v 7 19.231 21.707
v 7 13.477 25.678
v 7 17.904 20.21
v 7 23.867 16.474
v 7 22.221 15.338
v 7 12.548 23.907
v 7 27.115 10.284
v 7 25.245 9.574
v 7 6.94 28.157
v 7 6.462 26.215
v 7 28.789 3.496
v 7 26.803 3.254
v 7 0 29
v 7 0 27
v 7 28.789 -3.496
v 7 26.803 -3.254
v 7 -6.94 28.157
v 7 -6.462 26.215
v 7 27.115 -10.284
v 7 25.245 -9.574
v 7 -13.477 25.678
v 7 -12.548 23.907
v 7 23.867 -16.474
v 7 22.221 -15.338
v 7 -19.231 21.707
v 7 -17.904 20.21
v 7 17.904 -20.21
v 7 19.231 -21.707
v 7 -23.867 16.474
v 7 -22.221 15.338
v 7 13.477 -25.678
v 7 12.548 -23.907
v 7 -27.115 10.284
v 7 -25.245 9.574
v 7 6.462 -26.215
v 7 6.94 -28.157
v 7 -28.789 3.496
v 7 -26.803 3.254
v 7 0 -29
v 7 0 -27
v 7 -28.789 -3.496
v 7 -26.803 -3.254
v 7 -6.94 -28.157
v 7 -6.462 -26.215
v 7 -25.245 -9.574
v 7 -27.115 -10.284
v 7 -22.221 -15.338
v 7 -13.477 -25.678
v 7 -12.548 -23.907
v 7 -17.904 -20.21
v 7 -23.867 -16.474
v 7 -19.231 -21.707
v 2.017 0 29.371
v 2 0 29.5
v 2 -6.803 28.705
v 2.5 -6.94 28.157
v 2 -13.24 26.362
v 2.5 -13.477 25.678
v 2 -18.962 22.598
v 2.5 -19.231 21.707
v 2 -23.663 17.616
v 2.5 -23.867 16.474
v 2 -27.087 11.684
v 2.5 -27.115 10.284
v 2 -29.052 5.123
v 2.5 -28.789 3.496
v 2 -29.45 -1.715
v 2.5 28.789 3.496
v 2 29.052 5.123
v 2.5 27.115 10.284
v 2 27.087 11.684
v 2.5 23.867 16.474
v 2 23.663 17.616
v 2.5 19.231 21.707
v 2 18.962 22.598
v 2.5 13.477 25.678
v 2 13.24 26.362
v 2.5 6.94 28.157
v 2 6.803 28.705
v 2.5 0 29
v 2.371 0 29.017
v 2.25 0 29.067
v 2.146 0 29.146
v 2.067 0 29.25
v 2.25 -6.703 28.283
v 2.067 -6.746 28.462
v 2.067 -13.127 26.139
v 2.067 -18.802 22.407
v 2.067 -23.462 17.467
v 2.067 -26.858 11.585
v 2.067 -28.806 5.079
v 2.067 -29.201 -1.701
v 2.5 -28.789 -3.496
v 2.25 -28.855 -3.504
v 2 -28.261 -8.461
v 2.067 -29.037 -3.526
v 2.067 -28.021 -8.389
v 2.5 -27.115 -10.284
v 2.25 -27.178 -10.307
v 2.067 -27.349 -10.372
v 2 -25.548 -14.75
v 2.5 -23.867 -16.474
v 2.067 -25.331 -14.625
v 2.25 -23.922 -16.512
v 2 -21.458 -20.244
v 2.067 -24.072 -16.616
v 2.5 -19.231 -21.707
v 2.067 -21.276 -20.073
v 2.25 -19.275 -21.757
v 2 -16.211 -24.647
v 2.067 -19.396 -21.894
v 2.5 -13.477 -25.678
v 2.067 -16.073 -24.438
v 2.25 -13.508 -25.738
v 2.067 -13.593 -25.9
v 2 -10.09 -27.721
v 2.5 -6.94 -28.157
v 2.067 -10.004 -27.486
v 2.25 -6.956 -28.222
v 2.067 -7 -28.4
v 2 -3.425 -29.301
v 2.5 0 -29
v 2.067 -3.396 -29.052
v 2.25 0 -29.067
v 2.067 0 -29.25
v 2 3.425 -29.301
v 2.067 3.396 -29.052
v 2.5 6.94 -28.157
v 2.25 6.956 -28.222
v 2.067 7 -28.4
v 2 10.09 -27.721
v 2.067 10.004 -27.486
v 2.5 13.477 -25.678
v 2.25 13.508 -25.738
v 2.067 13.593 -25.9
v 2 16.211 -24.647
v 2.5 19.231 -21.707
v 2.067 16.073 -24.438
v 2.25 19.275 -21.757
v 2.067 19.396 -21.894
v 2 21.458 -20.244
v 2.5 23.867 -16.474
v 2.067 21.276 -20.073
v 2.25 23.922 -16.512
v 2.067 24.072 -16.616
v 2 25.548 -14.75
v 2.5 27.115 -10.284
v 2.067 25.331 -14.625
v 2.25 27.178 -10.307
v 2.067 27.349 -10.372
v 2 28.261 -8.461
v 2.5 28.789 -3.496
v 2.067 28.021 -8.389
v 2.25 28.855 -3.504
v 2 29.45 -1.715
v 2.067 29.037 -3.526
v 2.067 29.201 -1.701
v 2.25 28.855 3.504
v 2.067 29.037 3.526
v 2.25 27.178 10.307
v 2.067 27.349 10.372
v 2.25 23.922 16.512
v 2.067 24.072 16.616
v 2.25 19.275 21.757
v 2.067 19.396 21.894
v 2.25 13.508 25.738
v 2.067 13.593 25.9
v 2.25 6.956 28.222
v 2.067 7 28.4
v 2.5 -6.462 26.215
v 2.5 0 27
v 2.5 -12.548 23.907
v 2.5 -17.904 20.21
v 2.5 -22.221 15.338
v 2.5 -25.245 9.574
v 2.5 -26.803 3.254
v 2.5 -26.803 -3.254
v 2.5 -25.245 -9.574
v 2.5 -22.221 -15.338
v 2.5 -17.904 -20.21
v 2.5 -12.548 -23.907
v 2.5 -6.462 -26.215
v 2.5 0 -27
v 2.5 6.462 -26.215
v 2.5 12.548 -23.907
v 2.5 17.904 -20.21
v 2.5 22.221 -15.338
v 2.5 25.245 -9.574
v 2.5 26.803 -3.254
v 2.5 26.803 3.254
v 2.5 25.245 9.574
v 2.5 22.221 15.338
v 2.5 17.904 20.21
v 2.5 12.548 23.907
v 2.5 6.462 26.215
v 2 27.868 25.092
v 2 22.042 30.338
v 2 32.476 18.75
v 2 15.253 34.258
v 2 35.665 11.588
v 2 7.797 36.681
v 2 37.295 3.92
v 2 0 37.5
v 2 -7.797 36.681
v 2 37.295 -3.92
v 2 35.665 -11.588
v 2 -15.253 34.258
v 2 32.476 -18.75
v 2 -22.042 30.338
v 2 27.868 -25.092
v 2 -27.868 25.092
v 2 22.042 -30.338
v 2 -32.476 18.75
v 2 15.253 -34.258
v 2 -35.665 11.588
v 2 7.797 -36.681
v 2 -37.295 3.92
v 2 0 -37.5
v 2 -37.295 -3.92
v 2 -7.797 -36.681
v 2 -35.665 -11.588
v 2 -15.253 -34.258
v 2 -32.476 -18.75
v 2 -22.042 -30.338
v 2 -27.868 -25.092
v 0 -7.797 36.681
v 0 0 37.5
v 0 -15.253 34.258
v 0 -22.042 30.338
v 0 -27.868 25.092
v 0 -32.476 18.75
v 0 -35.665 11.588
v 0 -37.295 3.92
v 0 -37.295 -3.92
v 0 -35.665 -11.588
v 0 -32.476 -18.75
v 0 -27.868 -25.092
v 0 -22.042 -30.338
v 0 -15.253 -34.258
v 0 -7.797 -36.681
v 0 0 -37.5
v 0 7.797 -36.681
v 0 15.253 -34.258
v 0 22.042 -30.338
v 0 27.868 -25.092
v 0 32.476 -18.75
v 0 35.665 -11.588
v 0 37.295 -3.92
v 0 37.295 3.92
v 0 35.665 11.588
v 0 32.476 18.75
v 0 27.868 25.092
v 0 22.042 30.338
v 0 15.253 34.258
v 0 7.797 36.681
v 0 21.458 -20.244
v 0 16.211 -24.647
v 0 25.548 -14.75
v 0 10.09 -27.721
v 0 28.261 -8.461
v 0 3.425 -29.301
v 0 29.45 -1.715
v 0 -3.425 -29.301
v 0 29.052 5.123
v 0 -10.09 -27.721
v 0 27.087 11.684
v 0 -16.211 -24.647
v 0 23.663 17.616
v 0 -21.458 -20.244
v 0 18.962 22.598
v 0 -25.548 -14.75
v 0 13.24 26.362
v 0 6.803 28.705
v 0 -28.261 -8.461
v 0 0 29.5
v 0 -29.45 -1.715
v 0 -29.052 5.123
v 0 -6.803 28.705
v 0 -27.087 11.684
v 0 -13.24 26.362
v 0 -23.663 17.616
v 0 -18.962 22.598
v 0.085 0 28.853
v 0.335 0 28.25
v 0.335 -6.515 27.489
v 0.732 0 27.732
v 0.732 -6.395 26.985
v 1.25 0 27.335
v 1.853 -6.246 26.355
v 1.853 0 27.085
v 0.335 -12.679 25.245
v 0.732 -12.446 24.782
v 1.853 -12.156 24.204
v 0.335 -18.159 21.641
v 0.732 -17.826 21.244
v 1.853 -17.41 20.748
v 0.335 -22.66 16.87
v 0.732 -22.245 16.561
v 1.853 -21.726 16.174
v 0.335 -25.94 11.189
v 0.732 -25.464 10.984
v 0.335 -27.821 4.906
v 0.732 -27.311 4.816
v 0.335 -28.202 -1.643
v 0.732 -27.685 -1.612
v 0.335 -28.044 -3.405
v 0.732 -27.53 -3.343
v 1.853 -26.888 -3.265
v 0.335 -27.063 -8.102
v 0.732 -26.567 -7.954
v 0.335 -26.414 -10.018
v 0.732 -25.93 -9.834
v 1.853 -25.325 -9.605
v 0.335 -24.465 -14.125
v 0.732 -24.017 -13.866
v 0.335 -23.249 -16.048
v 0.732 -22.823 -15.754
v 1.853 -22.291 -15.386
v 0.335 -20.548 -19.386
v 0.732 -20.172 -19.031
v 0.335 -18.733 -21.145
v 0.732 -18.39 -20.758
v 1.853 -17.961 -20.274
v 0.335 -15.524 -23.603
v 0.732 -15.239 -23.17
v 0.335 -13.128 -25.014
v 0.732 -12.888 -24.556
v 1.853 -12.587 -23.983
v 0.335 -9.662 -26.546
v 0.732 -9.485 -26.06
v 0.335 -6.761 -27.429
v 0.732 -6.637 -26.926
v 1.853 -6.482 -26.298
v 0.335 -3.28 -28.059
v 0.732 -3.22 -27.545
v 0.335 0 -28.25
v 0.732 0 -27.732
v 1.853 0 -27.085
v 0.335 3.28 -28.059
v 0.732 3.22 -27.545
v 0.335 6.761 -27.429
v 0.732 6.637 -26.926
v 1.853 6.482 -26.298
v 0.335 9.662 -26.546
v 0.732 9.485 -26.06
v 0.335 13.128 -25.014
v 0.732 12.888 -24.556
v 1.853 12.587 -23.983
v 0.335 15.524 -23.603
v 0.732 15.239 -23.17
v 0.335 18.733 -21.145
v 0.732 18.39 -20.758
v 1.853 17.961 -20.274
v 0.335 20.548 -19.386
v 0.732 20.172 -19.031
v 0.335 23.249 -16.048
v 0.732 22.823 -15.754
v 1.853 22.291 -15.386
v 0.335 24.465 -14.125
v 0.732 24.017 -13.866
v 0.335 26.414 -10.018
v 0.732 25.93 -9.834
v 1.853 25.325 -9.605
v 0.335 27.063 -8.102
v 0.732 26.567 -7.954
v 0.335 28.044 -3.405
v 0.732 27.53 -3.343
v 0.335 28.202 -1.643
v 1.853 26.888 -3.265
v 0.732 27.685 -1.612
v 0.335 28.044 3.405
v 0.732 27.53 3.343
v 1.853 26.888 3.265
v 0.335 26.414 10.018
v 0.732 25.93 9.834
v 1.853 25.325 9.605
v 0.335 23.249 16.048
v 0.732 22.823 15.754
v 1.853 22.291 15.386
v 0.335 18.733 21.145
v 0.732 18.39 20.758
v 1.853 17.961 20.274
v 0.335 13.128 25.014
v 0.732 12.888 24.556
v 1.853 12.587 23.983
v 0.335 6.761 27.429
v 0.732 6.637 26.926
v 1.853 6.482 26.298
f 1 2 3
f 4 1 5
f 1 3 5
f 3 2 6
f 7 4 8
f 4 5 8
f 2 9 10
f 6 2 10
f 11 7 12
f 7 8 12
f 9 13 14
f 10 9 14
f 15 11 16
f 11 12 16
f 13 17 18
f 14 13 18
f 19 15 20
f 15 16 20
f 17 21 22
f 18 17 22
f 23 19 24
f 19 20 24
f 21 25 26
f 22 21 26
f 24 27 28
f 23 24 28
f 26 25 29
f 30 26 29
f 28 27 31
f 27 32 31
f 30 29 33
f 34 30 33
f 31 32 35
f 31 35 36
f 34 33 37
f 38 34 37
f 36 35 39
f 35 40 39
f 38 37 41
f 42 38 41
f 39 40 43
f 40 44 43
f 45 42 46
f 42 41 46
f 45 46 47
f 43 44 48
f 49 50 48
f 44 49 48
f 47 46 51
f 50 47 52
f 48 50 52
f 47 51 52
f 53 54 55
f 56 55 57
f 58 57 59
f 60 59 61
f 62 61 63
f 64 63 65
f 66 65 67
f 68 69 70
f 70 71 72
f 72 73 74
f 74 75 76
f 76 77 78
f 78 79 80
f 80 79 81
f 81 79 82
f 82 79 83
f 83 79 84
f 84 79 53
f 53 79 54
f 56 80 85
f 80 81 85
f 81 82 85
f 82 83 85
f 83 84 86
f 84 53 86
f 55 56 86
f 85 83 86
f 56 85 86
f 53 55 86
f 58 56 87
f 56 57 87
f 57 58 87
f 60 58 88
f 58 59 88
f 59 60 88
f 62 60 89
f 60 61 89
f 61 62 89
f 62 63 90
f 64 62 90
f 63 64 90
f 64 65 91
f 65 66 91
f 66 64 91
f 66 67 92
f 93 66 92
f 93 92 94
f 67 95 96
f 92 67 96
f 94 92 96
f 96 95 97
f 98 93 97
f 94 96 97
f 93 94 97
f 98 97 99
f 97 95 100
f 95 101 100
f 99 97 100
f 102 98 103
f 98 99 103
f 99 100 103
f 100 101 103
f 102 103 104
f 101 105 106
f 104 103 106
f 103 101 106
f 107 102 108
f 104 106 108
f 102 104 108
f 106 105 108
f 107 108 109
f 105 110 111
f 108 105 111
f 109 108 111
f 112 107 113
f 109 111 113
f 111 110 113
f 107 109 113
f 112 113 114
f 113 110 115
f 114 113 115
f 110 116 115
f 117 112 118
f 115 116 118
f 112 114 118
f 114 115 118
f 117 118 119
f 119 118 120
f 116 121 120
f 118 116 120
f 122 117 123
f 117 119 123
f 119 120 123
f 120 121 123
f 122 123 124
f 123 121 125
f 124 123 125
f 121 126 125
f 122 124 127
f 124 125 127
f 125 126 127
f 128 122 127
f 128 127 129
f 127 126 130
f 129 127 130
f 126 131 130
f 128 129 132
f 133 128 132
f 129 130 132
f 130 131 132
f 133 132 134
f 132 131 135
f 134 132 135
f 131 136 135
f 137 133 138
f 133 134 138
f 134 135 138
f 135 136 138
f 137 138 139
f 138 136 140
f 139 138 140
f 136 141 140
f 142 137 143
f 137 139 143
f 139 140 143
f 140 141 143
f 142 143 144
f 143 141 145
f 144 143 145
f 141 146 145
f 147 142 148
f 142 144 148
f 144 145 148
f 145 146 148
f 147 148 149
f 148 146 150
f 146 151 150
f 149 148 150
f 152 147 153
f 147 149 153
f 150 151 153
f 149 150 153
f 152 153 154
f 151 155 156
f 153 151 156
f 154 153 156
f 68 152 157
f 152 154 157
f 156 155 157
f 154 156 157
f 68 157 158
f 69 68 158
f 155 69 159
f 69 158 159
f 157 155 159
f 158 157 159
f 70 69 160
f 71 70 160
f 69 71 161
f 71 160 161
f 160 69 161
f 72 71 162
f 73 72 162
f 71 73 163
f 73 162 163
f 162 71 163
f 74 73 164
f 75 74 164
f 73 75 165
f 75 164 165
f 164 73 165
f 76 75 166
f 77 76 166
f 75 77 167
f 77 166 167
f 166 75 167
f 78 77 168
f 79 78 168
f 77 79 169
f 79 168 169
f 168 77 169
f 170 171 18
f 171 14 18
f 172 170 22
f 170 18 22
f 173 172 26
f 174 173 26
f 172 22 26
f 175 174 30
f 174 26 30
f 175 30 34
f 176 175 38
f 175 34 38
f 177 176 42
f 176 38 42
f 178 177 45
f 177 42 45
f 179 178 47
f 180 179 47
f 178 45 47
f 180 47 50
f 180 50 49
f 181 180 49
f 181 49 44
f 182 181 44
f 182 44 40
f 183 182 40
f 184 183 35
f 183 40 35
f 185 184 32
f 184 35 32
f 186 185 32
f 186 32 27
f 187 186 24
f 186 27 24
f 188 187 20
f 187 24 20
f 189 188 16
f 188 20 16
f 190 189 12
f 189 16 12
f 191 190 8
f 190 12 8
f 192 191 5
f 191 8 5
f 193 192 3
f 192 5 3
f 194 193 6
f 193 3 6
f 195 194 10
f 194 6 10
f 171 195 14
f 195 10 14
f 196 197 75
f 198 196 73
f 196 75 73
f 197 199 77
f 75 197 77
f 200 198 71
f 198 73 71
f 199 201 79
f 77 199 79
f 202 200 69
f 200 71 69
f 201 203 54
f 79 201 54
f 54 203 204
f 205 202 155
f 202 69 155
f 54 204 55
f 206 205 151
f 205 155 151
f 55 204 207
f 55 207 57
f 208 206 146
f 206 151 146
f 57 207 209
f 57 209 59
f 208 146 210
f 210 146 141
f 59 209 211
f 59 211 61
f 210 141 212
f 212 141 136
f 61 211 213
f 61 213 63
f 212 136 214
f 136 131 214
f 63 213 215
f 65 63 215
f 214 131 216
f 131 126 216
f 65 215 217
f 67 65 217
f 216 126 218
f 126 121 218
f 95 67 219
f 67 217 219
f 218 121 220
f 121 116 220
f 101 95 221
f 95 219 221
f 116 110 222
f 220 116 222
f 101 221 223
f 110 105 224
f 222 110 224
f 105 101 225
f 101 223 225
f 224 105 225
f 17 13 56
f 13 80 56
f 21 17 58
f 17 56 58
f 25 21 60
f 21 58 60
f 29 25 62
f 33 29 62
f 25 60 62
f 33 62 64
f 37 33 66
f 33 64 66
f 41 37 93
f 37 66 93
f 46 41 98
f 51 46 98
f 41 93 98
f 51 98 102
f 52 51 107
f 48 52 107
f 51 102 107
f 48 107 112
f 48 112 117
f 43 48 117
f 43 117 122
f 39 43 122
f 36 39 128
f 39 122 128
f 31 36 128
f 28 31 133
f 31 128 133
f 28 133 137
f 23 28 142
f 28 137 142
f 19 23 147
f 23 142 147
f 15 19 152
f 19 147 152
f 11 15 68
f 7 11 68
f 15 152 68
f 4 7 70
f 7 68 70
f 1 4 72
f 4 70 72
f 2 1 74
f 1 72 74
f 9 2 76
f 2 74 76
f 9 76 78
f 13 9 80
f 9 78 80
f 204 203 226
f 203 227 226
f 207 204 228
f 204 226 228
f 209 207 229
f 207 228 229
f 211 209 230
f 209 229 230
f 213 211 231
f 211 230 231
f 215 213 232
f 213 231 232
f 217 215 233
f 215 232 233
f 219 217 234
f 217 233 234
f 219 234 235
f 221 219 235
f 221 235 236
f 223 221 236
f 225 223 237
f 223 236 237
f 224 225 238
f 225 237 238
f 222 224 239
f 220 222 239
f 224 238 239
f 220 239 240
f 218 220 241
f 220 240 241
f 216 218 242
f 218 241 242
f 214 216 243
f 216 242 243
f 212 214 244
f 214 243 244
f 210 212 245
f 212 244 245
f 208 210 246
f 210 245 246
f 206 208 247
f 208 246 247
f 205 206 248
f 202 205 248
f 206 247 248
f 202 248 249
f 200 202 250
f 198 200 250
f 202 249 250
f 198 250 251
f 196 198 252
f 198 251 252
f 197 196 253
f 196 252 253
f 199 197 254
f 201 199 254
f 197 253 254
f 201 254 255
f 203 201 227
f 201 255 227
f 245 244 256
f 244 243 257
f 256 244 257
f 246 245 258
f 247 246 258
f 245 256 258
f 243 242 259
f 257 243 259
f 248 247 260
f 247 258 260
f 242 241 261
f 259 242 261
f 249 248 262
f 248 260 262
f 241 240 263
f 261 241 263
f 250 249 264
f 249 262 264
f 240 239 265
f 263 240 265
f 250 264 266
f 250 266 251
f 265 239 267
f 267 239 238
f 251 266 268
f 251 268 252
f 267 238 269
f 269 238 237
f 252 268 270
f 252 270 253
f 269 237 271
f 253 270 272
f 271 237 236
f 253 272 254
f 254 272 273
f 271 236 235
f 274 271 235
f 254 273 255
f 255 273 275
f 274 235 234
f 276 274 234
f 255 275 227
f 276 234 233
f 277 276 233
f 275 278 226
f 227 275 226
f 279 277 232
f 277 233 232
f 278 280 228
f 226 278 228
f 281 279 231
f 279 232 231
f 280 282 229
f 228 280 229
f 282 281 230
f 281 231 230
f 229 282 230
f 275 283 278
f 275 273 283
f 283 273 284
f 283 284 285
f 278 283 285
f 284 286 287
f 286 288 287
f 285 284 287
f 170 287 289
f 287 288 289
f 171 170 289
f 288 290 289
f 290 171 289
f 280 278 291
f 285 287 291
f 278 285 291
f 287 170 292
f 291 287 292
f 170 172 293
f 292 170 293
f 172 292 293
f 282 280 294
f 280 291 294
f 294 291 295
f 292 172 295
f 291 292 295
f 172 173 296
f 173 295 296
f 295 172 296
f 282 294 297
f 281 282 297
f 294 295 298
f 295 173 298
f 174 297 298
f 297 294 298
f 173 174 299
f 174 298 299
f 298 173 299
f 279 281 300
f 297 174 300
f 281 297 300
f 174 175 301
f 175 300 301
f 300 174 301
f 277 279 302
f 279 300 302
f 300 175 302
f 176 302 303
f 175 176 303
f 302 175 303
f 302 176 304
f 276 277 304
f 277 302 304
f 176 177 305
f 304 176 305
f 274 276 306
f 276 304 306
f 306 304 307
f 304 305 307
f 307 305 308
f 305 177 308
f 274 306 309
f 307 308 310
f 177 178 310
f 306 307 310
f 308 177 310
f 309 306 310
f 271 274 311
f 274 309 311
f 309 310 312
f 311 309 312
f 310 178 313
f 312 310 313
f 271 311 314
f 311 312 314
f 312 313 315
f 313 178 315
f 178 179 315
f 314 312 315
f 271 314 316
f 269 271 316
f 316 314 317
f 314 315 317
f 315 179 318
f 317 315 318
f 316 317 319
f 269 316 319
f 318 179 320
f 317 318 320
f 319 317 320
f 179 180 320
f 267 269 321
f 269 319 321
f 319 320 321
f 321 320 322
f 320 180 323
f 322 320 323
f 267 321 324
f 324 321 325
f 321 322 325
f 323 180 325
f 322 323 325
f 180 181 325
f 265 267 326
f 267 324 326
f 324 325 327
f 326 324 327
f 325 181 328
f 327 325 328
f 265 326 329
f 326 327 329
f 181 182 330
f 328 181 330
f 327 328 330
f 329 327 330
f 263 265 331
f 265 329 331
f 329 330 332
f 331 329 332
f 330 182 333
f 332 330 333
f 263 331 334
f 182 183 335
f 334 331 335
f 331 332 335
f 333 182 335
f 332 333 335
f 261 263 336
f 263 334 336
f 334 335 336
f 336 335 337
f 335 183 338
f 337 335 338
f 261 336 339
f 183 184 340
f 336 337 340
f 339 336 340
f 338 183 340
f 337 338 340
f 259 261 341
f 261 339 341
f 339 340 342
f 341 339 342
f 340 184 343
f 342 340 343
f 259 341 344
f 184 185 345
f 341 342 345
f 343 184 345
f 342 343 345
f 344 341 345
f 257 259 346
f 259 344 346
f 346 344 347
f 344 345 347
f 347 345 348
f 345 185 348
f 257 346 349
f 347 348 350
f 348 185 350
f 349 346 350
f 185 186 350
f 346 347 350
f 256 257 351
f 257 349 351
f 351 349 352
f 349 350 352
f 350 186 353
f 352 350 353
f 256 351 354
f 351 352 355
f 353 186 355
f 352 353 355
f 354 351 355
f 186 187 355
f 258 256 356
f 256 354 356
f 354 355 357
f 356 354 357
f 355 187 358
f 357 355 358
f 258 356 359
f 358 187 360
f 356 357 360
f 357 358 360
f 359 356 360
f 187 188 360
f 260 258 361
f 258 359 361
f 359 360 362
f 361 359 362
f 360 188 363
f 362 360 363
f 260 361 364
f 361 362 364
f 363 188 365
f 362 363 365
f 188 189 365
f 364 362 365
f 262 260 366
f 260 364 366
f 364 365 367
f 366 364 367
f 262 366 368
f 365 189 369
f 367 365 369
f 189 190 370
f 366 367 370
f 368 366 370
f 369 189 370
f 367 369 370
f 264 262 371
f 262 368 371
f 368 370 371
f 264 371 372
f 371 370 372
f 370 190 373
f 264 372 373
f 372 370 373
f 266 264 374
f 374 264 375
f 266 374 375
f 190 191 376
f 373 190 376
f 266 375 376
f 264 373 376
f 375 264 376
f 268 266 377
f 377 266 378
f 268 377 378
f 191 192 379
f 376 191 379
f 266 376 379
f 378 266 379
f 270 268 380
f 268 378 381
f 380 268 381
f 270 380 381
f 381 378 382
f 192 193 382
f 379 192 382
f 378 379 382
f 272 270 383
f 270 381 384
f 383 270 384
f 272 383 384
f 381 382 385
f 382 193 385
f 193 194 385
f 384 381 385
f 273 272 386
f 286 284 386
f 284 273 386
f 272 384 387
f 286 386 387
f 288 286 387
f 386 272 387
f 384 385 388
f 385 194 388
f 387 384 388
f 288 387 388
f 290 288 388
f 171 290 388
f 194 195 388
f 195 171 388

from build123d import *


with BuildPart() as part:
    # Esquisse1 → Base-Révol.-Mince (revolve)
    with BuildSketch(Plane.XY, mode=Mode.PRIVATE) as base_r_vol_mince_sk:
        with BuildLine():
            Line((0, 37.5), (0, 29.5))
            ThreePointArc((0, 29.5), (0.732233047, 27.732233047), (2.5, 27))
            Line((2.5, 27), (7, 27))
            Line((7, 27), (7, 29))
            Line((7, 29), (2.5, 29))
            ThreePointArc((2.5, 29), (2.146446609, 29.146446609), (2, 29.5))
            Line((2, 29.5), (2, 37.5))
            Line((2, 37.5), (0, 37.5))
        make_face()
    revolve(base_r_vol_mince_sk.sketch.rotate(Axis((0, 0, 0), (1, 0, 0)), 90), axis=Axis((0, 0, 0), (1, 0, 0)))


solid = part.part
